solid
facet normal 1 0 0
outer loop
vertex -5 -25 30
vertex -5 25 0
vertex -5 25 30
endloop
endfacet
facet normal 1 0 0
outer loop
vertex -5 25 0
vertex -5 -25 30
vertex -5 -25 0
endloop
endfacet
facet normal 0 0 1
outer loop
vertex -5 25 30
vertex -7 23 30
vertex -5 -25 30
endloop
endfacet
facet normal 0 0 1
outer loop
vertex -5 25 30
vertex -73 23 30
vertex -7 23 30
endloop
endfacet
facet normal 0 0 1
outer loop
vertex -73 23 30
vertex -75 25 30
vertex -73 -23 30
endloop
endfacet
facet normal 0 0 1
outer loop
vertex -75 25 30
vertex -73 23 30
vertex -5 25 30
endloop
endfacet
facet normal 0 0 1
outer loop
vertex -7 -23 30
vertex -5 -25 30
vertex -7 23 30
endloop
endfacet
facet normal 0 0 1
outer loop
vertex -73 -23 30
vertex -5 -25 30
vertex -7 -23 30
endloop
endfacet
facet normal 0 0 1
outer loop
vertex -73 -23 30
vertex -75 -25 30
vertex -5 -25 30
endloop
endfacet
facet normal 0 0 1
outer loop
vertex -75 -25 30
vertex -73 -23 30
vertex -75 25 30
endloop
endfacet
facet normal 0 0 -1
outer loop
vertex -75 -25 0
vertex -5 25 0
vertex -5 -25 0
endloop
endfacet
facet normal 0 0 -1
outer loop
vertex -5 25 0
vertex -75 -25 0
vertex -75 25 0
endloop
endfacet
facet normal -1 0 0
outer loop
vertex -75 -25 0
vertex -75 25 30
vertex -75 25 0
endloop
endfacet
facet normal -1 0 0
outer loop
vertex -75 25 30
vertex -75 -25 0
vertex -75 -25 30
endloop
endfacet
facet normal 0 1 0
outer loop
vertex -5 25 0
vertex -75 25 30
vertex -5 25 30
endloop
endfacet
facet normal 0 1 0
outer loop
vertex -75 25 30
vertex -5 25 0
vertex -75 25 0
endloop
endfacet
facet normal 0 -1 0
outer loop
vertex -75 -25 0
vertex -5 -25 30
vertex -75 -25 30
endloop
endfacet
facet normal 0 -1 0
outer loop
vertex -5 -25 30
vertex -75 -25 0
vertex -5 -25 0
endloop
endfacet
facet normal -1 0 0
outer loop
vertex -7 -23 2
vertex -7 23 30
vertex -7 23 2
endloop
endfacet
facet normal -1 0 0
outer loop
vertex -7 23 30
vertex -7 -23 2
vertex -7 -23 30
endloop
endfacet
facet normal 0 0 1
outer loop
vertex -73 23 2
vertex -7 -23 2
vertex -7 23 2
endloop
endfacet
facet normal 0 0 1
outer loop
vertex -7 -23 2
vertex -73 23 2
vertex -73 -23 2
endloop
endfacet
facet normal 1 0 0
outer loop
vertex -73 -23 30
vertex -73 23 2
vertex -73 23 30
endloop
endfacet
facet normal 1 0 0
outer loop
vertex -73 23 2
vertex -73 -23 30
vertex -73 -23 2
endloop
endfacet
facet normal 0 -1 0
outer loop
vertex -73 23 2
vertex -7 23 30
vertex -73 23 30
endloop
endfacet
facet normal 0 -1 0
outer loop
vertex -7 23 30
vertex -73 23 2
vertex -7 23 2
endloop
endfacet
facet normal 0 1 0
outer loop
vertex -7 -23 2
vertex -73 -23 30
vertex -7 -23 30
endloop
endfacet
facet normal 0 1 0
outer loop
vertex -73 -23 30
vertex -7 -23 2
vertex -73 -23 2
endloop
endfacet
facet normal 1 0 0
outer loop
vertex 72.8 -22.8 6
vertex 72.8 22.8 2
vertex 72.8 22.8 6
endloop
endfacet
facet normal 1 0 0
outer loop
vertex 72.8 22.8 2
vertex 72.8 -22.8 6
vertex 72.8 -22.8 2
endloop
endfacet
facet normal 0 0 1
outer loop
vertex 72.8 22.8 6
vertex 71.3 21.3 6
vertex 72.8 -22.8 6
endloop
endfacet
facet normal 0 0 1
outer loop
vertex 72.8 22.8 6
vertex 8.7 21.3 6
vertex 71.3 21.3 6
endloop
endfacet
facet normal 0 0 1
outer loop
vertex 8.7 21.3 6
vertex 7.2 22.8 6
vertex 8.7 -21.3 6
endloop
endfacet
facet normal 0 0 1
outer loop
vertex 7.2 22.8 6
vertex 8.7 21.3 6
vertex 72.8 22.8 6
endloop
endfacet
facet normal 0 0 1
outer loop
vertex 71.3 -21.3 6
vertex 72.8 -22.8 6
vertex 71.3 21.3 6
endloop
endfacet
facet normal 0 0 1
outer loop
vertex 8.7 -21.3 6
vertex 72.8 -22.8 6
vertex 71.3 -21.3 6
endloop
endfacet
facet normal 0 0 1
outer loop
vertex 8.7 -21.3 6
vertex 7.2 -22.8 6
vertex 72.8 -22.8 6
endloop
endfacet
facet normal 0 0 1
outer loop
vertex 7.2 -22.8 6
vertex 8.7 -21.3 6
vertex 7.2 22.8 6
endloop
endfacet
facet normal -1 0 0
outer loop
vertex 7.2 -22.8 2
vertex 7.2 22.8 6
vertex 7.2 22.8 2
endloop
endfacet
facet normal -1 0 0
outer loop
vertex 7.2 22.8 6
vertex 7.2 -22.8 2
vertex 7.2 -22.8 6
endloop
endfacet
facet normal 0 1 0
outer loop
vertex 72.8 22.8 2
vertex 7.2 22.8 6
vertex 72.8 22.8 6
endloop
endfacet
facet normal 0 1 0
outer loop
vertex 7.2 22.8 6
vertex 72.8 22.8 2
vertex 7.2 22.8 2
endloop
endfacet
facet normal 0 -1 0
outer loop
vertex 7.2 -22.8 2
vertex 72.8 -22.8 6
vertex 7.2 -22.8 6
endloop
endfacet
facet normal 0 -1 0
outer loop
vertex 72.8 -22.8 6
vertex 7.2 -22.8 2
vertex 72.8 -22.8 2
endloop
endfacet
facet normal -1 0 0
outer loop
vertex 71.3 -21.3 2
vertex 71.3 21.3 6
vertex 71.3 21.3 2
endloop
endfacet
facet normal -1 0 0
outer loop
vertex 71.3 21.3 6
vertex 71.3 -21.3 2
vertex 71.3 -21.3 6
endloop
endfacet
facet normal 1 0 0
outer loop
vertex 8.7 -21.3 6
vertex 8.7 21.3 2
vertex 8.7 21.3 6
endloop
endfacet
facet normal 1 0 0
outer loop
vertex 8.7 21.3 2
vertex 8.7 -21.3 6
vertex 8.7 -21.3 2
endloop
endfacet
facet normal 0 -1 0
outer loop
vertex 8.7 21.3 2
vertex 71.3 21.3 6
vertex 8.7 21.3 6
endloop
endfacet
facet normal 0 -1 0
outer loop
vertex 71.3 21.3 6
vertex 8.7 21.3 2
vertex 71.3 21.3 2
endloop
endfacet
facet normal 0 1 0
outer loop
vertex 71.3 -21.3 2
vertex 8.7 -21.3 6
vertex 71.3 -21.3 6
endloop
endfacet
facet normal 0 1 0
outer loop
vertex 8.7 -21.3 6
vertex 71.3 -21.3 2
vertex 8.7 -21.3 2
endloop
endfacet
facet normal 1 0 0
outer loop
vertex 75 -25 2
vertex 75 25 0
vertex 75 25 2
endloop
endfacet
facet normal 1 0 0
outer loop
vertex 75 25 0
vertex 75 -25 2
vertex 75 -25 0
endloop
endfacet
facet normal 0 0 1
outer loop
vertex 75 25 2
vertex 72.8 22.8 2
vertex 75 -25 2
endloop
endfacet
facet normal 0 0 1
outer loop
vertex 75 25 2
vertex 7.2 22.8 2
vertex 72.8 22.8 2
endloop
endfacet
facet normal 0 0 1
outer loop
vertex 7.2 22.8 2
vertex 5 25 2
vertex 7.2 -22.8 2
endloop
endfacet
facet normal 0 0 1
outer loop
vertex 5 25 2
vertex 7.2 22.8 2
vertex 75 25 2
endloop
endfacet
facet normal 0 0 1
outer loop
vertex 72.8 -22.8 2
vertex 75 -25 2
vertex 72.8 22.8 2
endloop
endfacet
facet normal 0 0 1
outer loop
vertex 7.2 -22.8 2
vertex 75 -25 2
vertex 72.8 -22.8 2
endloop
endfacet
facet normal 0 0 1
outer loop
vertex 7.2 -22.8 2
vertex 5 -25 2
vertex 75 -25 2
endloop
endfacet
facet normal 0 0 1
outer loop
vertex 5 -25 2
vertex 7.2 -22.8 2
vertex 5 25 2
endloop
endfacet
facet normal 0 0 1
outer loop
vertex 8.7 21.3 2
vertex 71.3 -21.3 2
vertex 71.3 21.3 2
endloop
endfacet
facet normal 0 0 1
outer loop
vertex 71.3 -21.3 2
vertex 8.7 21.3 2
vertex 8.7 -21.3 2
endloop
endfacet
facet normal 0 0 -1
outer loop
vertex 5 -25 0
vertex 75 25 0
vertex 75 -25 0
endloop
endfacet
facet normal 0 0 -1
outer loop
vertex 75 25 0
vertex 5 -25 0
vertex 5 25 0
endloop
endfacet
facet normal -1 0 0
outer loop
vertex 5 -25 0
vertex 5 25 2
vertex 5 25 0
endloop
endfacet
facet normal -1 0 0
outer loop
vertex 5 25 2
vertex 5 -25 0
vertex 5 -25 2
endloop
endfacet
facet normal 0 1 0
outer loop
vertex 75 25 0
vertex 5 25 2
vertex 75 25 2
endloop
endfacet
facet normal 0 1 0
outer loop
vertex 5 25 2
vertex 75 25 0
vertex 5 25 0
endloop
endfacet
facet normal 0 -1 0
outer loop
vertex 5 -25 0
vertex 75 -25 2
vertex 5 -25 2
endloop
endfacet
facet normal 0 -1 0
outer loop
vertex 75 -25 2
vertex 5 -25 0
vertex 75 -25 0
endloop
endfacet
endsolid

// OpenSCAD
// Two-part enclosure: open-top box + upside-down lid, printed side by side
// Units: mm

$fn = 64;

// ---------- Box ----------
box_x     = 70;    // box outer length (X)
box_y     = 50;    // box outer width (Y)
box_z     = 30;    // box outer height (Z)
wall      = 2;     // box wall thickness
floor_t   = 2;     // box floor thickness

// ---------- Lid ----------
lid_x     = 70;    // lid plate length (X)
lid_y     = 50;    // lid plate width (Y)
lid_t     = 2;     // lid plate thickness
lip_x     = 65.6;  // lip outer length (X)
lip_y     = 45.6;  // lip outer width (Y)
lip_wall  = 1.5;   // lip wall thickness
lip_h     = 4;     // lip height above plate

// ---------- Layout ----------
gap       = 10;    // gap between parts on the bed
eps       = 0.5;   // cutter overshoot past faces

// Centre the pair on the origin in X
total_x   = box_x + gap + lid_x;
box_cx    = -total_x/2 + box_x/2;          // box centre X
lid_cx    =  total_x/2 - lid_x/2;          // lid centre X (+X side)

// ---------- Part 1: box ----------
module box() {
    difference() {
        translate([-box_x/2, -box_y/2, 0])
            cube([box_x, box_y, box_z]);
        // inner cavity, open top
        translate([-(box_x - 2*wall)/2, -(box_y - 2*wall)/2, floor_t])
            cube([box_x - 2*wall, box_y - 2*wall, box_z - floor_t + eps]);
    }
}

// ---------- Part 2: lid (upside down) ----------
module lid() {
    union() {
        // plate on the bed
        translate([-lid_x/2, -lid_y/2, 0])
            cube([lid_x, lid_y, lid_t]);
        // rectangular lip on top of plate
        difference() {
            translate([-lip_x/2, -lip_y/2, lid_t - 0.01])
                cube([lip_x, lip_y, lip_h + 0.01]);
            translate([-(lip_x - 2*lip_wall)/2, -(lip_y - 2*lip_wall)/2, lid_t - eps])
                cube([lip_x - 2*lip_wall, lip_y - 2*lip_wall, lip_h + 2*eps]);
        }
    }
}

// ---------- Assembly on the bed ----------
translate([box_cx, 0, 0]) box();
translate([lid_cx, 0, 0]) lid();
